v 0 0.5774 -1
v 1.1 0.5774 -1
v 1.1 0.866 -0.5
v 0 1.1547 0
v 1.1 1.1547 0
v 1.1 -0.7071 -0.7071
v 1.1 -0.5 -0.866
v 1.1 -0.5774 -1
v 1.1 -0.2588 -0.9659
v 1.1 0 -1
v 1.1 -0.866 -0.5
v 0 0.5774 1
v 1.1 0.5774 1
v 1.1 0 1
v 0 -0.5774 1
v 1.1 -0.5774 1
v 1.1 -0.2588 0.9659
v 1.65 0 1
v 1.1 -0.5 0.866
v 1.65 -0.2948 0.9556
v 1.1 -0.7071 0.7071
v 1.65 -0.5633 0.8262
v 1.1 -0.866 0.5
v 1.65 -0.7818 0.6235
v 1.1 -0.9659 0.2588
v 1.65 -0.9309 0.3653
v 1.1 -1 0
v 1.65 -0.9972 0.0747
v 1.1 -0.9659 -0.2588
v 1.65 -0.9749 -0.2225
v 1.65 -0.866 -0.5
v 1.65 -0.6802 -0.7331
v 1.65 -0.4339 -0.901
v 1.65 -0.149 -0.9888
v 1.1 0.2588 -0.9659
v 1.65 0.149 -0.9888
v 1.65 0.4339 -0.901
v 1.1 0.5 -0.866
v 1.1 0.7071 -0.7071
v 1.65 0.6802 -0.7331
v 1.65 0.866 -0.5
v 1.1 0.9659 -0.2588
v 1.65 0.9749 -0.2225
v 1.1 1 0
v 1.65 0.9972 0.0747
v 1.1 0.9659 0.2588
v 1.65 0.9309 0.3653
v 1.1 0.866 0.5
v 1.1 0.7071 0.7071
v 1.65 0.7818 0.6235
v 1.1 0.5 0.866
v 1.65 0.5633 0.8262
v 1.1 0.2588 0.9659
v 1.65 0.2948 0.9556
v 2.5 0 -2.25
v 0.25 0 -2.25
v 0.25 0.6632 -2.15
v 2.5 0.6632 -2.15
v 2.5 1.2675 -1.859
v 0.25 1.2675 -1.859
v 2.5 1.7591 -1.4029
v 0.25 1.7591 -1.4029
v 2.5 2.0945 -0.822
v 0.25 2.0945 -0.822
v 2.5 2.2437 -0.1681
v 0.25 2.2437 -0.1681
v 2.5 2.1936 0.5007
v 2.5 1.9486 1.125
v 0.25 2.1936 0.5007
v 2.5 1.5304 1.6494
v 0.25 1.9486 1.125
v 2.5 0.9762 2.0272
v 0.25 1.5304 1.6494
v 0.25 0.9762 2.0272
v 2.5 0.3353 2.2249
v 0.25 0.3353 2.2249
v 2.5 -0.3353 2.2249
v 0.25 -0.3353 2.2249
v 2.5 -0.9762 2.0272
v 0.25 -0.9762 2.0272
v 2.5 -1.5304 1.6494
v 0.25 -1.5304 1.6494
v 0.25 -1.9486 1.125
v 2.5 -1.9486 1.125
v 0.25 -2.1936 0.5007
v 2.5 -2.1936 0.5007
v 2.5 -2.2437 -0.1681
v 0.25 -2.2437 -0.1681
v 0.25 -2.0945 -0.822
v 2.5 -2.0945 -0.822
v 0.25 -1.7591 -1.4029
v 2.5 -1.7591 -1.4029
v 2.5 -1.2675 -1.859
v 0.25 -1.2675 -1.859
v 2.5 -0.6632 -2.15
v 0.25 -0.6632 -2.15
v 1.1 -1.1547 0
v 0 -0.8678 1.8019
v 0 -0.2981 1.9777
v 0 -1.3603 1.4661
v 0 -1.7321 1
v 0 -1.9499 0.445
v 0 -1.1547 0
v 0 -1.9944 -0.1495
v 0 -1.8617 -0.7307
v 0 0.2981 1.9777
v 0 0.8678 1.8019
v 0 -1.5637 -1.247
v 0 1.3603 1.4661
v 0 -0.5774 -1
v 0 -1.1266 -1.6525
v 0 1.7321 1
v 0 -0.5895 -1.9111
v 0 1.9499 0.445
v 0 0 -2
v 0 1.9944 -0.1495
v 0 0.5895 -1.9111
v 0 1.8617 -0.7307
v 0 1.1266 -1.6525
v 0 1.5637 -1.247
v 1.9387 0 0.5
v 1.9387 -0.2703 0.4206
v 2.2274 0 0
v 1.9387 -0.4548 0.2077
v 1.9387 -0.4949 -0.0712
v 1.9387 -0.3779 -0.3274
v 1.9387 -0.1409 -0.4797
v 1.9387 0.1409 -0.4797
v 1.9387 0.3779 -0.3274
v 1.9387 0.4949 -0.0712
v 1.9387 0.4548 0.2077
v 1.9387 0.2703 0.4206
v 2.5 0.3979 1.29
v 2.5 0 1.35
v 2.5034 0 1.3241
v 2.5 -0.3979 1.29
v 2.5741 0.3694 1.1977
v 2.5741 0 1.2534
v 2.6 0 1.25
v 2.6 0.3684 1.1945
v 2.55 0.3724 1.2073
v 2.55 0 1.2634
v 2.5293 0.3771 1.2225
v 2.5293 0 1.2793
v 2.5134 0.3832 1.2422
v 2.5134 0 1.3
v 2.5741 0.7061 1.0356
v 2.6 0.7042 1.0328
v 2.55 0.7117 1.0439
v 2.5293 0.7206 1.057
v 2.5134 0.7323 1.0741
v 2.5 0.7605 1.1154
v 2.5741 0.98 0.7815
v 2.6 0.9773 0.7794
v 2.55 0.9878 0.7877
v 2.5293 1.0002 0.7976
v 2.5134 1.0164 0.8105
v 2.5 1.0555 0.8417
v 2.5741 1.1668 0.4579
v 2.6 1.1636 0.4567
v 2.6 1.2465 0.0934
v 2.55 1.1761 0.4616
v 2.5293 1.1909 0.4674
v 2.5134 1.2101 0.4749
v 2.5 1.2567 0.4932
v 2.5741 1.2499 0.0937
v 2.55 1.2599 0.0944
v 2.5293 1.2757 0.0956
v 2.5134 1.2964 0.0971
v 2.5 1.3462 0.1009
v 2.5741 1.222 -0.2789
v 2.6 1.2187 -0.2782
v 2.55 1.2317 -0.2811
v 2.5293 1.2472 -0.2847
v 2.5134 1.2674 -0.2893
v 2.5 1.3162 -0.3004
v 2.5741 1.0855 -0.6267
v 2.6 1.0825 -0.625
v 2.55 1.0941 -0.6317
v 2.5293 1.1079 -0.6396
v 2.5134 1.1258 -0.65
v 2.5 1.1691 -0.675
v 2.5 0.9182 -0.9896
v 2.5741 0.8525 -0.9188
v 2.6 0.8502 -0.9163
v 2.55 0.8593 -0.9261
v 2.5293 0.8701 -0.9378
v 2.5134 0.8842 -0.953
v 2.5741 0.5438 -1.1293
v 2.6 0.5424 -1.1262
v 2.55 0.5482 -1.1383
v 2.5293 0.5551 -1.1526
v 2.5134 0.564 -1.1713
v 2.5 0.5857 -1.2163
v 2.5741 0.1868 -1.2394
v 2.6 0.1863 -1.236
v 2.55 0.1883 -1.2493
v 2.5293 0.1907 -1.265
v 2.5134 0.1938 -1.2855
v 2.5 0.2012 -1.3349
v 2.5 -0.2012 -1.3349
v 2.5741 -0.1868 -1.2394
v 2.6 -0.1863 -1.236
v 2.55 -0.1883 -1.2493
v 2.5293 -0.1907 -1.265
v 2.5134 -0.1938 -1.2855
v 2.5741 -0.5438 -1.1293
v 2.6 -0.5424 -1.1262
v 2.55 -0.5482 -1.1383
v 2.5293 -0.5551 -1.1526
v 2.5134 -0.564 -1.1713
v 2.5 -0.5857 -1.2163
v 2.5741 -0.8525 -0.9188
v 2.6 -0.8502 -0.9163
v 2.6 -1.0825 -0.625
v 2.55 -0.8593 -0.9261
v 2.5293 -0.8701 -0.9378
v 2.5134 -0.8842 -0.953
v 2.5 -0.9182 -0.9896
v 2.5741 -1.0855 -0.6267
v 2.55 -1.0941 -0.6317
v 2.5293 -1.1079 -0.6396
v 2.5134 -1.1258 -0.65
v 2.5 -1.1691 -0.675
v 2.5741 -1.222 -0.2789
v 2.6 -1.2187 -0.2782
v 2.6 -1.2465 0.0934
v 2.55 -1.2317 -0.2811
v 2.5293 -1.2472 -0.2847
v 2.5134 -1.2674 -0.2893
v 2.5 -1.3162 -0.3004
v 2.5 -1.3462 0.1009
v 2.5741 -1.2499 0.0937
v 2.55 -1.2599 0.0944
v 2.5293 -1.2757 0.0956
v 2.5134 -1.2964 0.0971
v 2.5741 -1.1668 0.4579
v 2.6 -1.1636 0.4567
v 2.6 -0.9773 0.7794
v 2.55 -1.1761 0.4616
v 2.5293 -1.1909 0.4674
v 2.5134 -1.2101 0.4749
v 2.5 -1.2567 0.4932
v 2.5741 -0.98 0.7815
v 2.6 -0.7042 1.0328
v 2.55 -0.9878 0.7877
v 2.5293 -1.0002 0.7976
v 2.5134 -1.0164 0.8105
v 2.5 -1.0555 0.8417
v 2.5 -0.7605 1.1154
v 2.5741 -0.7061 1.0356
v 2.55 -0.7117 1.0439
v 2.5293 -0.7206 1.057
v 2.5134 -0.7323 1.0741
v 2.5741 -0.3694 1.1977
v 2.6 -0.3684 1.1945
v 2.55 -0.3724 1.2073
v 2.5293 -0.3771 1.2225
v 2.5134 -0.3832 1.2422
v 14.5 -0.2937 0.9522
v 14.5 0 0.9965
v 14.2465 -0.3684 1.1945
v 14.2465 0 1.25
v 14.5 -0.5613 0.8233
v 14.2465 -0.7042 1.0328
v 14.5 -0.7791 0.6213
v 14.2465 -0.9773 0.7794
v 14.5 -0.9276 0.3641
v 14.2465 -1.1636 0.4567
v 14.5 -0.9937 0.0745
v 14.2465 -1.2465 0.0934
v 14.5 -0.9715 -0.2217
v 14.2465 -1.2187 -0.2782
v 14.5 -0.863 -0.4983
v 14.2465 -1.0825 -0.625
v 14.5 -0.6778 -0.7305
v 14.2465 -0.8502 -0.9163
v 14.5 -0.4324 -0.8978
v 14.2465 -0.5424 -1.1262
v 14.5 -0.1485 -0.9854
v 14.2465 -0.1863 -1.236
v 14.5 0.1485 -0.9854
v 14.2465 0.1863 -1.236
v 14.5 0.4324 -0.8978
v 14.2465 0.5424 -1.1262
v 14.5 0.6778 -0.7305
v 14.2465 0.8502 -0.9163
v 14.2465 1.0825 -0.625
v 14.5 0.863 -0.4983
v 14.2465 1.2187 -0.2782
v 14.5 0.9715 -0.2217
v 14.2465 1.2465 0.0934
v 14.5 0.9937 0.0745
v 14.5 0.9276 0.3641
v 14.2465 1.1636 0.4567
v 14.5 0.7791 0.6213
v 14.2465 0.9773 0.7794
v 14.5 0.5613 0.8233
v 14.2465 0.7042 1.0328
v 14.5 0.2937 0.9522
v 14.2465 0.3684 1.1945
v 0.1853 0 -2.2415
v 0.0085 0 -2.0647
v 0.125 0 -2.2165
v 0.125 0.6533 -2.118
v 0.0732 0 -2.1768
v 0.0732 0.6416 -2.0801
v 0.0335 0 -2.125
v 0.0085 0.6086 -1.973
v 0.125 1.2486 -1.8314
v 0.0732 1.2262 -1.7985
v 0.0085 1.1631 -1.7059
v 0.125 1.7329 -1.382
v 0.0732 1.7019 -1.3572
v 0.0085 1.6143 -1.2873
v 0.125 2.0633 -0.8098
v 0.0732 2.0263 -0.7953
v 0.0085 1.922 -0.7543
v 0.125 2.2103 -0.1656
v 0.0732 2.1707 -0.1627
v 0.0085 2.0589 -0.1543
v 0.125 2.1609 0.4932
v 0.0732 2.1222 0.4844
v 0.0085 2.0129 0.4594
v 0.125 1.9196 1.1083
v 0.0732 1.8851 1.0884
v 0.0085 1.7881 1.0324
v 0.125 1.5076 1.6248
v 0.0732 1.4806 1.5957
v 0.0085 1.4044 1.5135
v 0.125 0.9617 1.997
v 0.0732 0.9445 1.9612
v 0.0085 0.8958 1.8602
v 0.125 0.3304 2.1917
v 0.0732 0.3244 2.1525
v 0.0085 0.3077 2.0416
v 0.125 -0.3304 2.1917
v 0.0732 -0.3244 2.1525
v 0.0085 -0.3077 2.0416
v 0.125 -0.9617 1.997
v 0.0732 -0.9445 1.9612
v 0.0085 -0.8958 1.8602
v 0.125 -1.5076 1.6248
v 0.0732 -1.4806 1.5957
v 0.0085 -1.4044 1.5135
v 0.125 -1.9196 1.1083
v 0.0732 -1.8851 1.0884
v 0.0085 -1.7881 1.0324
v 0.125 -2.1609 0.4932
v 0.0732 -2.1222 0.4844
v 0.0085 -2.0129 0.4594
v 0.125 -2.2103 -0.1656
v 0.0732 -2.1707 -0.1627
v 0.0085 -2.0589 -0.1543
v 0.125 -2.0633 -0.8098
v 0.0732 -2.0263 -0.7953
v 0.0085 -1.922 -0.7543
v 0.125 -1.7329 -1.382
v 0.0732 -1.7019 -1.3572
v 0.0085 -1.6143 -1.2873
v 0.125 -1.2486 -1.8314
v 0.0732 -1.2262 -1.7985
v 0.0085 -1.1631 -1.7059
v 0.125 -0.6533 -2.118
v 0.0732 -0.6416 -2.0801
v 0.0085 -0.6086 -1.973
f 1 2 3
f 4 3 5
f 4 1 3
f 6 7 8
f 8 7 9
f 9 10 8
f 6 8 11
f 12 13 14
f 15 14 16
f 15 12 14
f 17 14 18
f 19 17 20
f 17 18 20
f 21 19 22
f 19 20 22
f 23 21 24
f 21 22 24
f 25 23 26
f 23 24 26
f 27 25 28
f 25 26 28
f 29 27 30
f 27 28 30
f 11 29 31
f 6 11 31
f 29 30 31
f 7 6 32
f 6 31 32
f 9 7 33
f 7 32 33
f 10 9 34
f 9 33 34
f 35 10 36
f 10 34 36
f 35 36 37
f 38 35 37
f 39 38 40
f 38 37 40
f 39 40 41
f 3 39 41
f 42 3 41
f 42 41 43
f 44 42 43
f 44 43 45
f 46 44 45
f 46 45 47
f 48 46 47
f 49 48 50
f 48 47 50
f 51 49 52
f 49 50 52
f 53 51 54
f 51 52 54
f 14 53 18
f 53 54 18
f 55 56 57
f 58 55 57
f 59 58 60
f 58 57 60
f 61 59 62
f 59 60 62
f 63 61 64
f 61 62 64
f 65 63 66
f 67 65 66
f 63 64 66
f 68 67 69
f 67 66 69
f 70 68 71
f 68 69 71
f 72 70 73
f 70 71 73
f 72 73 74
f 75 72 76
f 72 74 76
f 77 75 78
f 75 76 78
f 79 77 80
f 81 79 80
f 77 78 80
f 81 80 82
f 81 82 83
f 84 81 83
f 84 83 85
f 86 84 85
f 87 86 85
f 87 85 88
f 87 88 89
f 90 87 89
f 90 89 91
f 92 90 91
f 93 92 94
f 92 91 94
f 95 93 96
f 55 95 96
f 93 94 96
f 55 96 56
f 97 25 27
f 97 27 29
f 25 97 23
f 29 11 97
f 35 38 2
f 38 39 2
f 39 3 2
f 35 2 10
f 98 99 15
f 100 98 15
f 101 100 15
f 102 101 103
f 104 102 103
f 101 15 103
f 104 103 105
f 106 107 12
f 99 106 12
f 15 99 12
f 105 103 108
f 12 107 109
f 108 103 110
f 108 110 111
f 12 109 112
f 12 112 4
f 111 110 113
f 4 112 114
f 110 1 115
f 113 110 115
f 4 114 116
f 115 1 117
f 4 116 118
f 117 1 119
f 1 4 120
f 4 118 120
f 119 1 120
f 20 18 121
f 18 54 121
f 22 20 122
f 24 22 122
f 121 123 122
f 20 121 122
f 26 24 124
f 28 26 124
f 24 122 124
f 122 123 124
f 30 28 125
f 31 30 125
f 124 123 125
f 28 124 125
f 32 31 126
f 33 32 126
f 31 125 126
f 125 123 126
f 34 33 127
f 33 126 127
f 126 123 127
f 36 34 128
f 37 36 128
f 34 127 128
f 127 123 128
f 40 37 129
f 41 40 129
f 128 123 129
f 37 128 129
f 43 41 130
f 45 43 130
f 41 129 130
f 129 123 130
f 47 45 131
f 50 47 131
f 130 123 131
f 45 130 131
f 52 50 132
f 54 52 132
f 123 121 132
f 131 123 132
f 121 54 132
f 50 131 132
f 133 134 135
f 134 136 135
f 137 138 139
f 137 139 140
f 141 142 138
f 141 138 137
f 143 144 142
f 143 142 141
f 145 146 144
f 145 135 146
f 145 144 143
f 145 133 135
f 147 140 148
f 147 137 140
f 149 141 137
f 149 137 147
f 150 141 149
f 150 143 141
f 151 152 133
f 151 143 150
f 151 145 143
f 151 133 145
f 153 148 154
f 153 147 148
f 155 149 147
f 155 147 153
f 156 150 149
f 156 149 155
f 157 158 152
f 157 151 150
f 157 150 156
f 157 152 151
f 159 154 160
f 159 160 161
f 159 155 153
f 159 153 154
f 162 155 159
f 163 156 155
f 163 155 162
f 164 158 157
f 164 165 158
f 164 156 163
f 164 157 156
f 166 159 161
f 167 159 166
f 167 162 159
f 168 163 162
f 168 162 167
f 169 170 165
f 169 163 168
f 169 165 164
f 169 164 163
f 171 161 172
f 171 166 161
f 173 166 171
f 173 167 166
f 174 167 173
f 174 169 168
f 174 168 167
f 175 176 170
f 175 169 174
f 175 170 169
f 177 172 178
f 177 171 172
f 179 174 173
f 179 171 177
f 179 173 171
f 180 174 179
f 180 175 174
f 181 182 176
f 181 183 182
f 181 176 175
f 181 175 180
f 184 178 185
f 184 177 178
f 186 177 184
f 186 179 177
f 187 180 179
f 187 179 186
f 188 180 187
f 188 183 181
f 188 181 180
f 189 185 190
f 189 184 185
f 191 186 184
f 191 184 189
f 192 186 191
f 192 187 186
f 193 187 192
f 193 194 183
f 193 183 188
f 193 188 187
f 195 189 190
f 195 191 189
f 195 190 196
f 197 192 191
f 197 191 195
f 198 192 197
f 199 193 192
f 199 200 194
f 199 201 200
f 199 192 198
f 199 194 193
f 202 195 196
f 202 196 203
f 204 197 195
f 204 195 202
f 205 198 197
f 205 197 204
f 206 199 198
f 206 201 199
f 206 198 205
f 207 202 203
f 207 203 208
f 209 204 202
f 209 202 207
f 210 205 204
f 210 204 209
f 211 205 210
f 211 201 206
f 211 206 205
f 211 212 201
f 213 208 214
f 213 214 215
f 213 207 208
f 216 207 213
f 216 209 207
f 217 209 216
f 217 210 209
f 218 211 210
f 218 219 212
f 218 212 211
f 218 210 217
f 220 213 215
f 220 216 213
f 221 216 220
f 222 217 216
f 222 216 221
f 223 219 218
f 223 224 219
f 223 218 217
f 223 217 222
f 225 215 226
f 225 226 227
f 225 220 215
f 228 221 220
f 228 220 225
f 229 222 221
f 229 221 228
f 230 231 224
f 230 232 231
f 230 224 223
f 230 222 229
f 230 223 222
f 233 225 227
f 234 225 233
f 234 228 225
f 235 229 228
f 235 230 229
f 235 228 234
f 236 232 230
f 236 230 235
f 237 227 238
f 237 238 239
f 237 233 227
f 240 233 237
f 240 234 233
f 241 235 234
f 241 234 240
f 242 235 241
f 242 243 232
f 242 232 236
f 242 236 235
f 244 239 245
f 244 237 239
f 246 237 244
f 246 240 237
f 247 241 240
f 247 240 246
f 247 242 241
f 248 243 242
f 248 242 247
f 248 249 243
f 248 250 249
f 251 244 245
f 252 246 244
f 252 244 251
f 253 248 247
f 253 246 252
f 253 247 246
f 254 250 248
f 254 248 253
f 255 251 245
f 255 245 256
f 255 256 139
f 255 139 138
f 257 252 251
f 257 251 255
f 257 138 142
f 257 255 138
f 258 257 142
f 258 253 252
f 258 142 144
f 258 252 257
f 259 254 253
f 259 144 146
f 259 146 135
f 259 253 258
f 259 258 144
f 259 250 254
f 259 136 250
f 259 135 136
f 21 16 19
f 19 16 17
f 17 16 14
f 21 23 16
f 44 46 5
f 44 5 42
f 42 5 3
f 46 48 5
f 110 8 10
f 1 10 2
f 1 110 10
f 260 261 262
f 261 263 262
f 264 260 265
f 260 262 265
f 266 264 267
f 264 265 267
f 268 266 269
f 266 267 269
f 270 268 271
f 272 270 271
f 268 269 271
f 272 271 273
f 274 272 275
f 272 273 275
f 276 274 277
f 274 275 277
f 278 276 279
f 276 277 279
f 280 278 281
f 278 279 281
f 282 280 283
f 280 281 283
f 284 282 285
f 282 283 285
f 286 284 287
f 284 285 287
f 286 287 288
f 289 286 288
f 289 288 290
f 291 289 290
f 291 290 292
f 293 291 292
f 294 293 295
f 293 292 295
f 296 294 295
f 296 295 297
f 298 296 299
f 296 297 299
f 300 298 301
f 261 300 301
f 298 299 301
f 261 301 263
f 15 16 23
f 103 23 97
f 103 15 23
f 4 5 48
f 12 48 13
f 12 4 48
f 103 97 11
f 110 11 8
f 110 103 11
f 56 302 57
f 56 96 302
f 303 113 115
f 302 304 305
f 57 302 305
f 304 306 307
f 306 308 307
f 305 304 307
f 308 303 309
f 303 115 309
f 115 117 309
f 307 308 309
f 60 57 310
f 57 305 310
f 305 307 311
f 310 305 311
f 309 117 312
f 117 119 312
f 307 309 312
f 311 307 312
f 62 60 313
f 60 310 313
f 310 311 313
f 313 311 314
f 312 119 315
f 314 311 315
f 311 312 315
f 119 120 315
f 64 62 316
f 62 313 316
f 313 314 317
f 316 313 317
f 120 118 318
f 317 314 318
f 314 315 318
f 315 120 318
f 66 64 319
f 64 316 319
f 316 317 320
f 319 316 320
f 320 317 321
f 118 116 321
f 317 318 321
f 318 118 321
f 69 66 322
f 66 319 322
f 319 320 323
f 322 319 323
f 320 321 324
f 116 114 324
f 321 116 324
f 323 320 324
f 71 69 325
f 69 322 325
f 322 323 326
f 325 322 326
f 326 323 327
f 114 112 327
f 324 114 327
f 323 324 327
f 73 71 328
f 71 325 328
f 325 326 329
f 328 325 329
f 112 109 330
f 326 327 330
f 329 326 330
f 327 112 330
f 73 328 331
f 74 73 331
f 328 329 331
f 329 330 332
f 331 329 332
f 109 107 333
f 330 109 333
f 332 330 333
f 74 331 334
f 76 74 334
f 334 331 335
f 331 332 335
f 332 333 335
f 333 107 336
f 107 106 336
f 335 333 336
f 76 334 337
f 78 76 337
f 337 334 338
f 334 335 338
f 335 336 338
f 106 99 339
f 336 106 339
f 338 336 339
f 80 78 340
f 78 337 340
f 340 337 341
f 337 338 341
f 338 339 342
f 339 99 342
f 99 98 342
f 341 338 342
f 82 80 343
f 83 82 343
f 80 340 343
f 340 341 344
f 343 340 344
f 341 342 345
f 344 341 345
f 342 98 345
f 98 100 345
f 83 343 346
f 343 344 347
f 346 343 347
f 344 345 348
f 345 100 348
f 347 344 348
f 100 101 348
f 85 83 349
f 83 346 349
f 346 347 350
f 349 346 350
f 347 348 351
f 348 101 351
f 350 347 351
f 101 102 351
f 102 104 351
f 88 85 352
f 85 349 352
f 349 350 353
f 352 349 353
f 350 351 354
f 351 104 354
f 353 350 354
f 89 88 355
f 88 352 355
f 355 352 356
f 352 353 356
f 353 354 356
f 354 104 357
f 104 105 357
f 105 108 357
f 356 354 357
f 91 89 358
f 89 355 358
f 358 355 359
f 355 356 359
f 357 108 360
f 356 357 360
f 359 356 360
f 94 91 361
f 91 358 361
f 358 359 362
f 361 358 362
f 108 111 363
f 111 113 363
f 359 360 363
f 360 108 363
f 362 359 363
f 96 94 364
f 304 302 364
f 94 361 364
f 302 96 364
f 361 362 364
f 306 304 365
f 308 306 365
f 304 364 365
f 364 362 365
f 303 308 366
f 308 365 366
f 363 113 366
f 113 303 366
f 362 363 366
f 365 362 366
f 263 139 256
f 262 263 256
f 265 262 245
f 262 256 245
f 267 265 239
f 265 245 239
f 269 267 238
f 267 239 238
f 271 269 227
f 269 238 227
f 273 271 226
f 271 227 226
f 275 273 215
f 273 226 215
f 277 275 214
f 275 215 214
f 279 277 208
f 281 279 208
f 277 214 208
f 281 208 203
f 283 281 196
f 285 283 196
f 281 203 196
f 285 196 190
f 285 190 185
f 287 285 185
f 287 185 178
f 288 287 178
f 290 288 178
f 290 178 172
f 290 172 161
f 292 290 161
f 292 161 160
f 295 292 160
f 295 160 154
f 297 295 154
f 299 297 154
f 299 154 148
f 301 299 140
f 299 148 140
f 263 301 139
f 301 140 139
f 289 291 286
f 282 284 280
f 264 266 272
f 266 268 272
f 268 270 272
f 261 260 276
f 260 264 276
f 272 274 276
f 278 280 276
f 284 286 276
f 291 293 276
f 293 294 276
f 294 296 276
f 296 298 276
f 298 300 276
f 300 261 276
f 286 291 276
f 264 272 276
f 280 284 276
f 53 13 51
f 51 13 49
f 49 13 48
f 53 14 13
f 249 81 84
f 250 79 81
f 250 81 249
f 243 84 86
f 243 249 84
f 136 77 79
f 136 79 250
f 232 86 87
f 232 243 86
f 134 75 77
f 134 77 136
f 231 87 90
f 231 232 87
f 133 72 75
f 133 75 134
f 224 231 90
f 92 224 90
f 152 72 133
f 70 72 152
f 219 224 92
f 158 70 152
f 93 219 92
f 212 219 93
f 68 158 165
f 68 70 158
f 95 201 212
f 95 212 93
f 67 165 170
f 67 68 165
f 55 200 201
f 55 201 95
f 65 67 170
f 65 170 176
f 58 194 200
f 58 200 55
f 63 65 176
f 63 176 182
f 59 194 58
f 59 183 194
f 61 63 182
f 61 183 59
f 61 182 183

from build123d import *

# Parameters (mm, degrees)
BASEHEADSKE_R   = 2.25
BASEHEAD_DEPTH  = 2.5
CUTSOCKET_DEPTH = 1.1
FILLET1_R       = 0.1
FILLET2_R       = 0.25


with BuildPart() as part:
    # BaseHeadSke → BaseHead (new body)
    with BuildSketch(Plane(origin=(0, 0, 0), x_dir=(0, 0, -1), z_dir=(1, 0, 0))):
        Circle(BASEHEADSKE_R)
    extrude(amount=BASEHEAD_DEPTH)

    # BodySke → BaseBody (revolve)
    with BuildSketch(Plane.XY, mode=Mode.PRIVATE) as basebody_sk:
        Polygon((0, 0), (14.5, 0), (14.5, 0.9965), (14.2465, 1.25), (0, 1.25), align=None)
    revolve(basebody_sk.sketch.rotate(Axis((0, 0, 0), (1, 0, 0)), 90), axis=Axis((0, 0, 0), (1, 0, 0)))

    # CutSocketSke → CutSocket (cut)
    with BuildSketch(Plane(origin=(0, 0, 0), x_dir=(0, 0, -1), z_dir=(1, 0, 0))):
        Polygon((0, 1.154700538), (-1, 0.577350269), (-1, -0.577350269), (0, -1.154700538), (1, -0.577350269), (1, 0.577350269), align=None)
    extrude(amount=CUTSOCKET_DEPTH, mode=Mode.SUBTRACT)

    # CutHoleSke → CutHole (revolve, cut)
    with BuildSketch(Plane.XY, mode=Mode.PRIVATE) as cuthole_sk:
        Polygon((0, 1), (1.65, 1), (2.227350269, 0), (0, 0), align=None)
    revolve(cuthole_sk.sketch.rotate(Axis((0, 0, 0), (1, 0, 0)), 90), axis=Axis((0, 0, 0), (1, 0, 0)), mode=Mode.SUBTRACT)

    # Fillet1
    fillet1_edges = [part.edges().sort_by_distance(p)[0] for p in [
        (2.5, 0, -1.25),
    ]]
    fillet(fillet1_edges, radius=FILLET1_R)

    # Fillet2
    fillet2_edges = [part.edges().sort_by_distance(p)[0] for p in [
        (0, 0, 2.25),
    ]]
    fillet(fillet2_edges, radius=FILLET2_R)


solid = part.part
